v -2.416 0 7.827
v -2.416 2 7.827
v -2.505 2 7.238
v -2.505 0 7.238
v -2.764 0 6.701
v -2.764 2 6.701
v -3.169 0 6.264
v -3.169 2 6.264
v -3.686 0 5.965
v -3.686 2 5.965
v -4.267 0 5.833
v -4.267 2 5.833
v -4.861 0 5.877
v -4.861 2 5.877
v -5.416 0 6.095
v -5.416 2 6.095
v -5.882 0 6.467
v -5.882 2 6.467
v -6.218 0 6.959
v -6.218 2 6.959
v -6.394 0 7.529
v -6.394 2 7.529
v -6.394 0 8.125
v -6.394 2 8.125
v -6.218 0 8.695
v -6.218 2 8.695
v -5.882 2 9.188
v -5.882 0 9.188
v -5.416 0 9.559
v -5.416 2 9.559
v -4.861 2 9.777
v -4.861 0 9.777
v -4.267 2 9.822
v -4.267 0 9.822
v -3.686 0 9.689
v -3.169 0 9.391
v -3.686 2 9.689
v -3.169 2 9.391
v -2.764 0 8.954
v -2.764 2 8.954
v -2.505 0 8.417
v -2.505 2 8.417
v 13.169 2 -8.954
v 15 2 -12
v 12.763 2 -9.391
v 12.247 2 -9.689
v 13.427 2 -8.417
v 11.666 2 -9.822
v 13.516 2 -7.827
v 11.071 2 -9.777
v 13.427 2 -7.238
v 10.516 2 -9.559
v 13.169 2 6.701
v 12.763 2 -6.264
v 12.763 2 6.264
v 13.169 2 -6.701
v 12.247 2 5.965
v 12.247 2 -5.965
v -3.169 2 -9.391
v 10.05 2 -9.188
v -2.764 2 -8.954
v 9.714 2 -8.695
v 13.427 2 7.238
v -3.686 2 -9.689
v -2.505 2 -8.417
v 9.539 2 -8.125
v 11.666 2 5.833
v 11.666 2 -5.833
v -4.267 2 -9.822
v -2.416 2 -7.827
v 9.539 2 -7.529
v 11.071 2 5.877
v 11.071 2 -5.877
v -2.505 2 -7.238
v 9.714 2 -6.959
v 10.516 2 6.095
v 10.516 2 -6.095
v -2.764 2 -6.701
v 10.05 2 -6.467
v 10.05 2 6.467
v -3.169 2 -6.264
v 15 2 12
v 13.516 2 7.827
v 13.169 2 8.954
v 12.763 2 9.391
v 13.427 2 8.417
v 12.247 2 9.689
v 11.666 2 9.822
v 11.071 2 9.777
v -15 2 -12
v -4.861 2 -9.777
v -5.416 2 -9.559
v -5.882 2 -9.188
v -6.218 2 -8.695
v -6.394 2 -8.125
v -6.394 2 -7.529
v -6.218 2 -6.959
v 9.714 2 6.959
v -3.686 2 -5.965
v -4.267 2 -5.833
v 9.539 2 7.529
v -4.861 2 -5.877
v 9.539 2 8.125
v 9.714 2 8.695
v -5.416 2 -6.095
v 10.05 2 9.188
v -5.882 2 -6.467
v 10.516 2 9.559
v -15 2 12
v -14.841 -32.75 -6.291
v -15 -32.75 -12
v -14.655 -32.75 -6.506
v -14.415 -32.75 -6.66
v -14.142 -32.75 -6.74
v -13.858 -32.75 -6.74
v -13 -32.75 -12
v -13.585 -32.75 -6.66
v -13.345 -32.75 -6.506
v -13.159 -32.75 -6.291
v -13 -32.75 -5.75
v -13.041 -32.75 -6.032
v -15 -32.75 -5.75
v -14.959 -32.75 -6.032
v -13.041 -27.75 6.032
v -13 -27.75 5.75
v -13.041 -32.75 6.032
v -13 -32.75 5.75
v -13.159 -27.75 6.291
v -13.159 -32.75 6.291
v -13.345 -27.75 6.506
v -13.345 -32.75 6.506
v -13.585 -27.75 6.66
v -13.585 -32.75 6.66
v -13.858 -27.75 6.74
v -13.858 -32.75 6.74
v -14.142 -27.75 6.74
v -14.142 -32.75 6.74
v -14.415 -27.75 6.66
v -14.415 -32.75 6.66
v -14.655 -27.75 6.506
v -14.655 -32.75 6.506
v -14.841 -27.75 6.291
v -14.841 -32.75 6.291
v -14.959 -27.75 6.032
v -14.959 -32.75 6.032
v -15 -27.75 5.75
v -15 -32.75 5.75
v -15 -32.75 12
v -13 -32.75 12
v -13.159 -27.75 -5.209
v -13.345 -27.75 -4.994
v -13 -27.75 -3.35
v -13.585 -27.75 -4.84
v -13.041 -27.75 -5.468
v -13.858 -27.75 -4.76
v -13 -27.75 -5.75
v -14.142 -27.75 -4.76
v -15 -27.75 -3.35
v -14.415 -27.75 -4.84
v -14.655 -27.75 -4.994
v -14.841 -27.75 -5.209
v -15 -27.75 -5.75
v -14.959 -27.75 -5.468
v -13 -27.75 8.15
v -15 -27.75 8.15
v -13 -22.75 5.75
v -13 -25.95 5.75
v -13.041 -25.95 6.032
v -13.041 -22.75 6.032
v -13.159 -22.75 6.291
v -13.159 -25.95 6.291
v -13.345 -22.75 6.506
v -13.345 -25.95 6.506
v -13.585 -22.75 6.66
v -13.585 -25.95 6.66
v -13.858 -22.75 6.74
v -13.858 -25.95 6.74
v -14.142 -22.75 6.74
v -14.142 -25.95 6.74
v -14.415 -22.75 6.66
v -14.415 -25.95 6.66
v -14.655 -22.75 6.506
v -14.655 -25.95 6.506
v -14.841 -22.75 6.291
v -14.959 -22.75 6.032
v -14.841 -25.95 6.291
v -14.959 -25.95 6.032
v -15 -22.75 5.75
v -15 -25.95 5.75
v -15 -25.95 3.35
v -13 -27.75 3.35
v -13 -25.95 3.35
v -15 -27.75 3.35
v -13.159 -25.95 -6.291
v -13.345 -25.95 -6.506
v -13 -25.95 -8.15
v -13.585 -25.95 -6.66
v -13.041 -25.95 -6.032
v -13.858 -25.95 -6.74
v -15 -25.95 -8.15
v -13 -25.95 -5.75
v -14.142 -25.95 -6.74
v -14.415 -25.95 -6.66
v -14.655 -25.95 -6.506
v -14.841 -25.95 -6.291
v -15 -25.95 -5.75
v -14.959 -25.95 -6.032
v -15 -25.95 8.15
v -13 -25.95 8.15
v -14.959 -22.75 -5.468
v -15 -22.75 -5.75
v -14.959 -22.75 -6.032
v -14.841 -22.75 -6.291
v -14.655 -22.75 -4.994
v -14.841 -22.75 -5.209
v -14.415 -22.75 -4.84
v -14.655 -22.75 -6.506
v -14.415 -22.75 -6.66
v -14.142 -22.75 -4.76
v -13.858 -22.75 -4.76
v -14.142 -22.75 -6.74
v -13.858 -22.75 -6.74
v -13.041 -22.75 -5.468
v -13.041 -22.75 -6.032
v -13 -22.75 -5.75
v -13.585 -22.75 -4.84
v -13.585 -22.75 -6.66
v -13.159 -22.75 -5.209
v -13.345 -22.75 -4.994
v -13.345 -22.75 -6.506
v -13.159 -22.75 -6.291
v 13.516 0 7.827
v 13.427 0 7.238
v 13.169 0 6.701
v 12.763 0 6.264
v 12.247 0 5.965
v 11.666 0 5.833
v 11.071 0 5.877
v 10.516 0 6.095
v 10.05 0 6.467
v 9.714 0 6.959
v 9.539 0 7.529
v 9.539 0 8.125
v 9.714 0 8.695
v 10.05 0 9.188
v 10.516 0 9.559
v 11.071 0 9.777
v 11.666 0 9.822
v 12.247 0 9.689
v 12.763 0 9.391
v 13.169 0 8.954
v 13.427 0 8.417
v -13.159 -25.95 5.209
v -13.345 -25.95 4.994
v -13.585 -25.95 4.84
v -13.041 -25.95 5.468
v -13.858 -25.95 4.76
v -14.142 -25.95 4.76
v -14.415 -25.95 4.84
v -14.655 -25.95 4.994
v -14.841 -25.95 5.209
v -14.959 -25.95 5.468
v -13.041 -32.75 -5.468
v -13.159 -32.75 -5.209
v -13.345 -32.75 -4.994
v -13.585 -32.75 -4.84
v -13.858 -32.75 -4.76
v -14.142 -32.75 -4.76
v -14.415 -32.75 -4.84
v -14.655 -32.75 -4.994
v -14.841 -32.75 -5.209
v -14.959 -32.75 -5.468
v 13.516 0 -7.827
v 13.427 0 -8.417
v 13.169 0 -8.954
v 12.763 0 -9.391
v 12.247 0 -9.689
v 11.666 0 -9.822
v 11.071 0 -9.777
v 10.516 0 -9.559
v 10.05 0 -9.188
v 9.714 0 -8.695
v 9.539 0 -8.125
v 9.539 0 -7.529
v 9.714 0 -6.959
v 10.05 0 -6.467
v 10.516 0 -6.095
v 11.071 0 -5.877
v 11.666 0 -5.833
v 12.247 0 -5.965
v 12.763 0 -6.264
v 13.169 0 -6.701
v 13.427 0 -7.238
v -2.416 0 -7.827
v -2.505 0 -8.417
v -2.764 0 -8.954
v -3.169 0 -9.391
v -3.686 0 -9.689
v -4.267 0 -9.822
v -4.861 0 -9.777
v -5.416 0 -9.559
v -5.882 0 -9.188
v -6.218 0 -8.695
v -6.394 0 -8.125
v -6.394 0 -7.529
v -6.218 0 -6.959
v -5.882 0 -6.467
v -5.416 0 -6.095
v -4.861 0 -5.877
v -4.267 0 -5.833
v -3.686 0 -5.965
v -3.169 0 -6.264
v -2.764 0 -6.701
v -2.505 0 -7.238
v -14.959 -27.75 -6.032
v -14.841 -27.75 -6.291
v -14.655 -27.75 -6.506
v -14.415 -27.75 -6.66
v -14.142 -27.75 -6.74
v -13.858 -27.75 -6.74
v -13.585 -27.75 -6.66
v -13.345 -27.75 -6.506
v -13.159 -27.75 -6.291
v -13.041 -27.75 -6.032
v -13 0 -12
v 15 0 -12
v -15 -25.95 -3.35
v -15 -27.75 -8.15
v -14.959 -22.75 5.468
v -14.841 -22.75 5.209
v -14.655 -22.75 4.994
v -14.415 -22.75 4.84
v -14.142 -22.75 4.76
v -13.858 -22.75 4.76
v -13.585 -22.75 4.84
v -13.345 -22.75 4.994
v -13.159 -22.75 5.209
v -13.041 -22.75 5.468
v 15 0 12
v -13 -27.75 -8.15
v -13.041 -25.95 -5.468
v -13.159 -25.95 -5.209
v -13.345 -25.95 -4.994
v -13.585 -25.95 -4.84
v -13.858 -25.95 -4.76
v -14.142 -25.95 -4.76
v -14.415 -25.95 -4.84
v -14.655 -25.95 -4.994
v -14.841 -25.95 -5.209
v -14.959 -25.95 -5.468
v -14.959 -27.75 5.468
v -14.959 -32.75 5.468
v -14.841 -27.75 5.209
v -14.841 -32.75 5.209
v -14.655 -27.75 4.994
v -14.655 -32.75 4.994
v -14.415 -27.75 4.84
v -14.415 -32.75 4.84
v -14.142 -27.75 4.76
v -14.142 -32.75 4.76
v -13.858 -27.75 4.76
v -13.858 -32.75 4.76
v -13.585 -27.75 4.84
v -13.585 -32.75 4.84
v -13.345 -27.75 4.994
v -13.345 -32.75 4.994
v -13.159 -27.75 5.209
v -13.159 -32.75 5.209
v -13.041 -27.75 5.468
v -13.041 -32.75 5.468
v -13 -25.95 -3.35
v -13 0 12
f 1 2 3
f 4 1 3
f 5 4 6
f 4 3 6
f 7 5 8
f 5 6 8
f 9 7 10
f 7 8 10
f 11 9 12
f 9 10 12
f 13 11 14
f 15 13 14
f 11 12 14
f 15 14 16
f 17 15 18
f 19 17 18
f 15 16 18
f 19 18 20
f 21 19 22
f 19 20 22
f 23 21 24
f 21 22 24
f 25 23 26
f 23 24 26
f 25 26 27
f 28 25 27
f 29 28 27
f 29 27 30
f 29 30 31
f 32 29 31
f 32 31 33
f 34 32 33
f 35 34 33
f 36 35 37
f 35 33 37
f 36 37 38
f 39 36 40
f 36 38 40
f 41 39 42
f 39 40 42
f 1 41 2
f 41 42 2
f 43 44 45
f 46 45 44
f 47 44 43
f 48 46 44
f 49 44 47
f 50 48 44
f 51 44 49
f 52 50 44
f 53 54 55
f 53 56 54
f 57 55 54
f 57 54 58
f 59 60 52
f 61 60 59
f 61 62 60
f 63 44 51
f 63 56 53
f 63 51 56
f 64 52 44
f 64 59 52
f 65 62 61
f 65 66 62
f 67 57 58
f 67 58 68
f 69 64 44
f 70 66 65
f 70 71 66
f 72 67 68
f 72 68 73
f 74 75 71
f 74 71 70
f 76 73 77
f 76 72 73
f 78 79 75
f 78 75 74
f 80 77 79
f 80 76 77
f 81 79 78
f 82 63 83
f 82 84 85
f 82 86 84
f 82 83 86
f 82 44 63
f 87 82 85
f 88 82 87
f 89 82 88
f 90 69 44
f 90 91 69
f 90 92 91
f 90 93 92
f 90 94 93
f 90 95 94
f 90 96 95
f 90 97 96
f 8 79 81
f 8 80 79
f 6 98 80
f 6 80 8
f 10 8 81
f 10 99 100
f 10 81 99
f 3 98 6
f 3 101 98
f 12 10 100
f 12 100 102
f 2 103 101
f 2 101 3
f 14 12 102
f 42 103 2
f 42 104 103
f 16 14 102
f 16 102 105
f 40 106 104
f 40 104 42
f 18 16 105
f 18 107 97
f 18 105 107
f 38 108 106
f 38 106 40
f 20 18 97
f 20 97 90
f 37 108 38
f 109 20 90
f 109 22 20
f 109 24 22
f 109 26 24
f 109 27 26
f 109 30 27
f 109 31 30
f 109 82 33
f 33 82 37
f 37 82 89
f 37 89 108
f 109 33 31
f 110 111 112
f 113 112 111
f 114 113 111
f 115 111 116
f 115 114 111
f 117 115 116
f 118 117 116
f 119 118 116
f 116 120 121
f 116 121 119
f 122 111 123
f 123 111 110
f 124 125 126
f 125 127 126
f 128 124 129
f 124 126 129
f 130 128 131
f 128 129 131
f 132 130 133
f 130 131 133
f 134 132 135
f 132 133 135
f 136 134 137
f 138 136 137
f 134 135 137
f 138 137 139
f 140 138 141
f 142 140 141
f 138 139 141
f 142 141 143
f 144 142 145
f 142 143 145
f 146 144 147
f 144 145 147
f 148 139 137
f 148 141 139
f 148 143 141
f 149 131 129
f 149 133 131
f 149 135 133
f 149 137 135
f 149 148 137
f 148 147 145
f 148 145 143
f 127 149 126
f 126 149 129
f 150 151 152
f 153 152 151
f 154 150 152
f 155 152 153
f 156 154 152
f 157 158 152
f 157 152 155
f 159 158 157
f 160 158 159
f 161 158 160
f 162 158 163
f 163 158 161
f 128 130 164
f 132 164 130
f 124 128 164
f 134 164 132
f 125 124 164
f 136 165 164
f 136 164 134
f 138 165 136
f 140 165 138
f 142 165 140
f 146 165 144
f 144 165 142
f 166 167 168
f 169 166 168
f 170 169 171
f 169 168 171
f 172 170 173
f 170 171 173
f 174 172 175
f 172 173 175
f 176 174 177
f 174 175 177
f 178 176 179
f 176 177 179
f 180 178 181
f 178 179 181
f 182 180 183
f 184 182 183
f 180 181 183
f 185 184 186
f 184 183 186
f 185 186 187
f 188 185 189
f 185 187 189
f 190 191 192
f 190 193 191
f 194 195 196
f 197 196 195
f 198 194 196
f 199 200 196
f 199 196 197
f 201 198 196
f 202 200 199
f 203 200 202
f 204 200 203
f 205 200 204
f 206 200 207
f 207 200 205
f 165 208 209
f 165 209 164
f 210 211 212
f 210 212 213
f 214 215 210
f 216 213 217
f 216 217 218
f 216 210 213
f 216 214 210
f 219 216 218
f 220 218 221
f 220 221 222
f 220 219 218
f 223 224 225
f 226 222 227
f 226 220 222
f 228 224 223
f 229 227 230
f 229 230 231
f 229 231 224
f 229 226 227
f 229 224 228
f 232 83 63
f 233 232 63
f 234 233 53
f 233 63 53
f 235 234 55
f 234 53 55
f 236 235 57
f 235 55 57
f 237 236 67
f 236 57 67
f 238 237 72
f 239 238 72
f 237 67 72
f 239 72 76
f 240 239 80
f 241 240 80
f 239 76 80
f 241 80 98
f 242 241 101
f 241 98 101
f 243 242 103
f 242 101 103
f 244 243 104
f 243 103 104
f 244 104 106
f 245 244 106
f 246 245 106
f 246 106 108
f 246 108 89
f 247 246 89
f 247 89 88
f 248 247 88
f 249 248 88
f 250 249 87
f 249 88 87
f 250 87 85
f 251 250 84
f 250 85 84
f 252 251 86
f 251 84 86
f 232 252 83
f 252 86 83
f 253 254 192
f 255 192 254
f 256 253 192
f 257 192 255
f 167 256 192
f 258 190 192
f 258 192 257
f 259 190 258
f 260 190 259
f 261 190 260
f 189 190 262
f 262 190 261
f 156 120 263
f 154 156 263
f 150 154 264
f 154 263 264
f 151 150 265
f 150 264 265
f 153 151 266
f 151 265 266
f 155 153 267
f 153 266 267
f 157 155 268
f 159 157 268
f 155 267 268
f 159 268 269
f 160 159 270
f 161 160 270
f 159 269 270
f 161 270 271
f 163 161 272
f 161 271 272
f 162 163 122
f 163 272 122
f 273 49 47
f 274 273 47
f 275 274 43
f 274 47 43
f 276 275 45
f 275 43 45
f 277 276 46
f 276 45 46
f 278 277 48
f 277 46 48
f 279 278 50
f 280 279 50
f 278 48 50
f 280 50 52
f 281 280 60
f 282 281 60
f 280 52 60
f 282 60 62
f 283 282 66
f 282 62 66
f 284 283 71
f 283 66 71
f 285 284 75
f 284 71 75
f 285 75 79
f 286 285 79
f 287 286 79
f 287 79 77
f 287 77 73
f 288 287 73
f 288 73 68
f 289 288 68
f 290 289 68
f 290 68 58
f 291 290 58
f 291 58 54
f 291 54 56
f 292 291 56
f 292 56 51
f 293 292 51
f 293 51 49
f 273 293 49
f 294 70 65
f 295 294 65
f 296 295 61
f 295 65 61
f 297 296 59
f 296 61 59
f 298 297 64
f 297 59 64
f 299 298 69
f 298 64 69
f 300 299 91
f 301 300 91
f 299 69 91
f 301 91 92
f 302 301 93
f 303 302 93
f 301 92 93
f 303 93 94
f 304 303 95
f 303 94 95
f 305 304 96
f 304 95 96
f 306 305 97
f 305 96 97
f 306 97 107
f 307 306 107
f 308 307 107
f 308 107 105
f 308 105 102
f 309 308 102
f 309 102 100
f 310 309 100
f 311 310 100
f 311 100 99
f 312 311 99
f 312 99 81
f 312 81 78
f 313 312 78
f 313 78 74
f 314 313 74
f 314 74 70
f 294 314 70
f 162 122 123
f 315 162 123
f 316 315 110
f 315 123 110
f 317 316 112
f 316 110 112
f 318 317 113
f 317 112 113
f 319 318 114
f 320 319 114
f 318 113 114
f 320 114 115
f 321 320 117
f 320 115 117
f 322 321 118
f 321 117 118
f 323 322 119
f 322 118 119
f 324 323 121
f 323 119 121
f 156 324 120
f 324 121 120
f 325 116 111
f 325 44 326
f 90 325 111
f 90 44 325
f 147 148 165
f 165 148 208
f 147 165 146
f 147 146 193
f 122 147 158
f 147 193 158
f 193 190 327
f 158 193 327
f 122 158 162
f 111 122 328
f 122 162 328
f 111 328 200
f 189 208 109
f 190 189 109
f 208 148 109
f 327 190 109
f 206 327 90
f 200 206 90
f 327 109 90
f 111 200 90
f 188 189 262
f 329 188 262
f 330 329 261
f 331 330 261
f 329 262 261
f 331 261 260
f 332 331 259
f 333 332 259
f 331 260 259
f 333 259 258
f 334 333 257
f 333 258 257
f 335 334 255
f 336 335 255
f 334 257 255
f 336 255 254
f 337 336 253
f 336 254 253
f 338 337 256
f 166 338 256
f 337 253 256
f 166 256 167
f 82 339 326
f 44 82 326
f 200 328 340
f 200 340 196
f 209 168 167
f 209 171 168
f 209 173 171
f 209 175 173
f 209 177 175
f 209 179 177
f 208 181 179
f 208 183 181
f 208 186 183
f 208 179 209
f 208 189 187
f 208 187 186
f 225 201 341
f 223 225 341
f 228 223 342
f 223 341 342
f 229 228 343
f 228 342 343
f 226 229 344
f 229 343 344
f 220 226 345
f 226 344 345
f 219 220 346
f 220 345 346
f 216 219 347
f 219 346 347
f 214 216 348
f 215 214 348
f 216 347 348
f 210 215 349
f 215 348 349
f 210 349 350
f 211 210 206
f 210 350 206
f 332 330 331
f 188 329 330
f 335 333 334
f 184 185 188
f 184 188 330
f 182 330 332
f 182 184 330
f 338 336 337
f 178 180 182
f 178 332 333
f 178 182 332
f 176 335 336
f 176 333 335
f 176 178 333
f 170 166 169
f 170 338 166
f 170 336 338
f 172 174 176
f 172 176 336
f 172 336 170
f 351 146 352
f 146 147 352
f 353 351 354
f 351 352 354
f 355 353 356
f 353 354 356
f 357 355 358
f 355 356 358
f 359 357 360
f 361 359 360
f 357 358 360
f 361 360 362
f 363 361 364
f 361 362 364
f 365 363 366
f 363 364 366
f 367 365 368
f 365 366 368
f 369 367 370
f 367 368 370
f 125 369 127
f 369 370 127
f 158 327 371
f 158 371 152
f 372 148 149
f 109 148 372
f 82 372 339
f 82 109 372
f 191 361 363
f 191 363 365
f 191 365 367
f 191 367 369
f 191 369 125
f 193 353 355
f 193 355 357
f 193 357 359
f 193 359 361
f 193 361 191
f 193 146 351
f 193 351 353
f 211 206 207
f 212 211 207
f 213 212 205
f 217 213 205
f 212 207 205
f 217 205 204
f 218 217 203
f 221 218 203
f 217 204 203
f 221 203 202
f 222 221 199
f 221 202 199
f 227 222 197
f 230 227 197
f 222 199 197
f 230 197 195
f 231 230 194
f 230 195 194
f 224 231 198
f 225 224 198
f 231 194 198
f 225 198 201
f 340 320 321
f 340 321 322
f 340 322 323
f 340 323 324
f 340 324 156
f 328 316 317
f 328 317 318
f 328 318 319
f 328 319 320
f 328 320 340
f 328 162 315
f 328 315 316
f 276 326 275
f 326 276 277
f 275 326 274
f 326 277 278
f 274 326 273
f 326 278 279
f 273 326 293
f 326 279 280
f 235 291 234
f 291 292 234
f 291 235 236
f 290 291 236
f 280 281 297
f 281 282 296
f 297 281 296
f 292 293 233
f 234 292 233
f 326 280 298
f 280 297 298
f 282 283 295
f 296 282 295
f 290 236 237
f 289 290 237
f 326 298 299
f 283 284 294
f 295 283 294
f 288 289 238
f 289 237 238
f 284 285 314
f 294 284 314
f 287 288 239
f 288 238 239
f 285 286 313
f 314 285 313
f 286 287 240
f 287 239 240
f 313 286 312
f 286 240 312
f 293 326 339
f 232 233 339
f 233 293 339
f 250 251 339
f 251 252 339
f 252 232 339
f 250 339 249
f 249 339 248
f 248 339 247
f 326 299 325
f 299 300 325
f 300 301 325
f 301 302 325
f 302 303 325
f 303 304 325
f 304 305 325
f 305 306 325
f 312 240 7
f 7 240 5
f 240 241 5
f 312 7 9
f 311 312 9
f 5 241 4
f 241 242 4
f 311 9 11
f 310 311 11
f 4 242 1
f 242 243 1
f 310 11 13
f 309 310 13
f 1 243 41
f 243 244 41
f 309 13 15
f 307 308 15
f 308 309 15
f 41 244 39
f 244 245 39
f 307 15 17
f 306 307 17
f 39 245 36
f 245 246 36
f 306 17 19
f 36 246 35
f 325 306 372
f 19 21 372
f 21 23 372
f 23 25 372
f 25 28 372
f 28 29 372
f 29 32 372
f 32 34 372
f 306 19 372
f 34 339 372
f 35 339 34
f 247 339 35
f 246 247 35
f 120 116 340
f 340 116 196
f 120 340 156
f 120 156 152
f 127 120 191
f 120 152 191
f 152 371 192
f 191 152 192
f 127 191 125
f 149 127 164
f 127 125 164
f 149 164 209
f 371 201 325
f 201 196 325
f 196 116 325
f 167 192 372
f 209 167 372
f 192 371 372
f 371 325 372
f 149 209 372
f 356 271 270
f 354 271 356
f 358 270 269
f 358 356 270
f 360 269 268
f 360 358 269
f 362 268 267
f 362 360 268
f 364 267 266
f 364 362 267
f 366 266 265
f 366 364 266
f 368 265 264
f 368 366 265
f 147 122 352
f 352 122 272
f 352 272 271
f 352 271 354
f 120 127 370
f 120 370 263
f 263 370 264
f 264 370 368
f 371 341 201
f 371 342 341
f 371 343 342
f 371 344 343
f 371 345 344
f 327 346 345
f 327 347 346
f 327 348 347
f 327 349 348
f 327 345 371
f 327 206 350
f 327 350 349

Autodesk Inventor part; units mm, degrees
ref_plane "YZ Plane" through (0, 0, 0) normal (1, 0, 0) x (0, 1, 0)
ref_plane "XZ Plane" through (0, 0, 0) normal (0, 1, 0) x (-1, 0, 0)
sketch "Эскиз1" plane through (0, 0, 0) normal (0, 1, 0) x (-1, 0, 0)
  line L0 (-15, -12) -> (15, -12)
  line L1 (15, -12) -> (15, 12)
  line L2 (15, 12) -> (-15, 12)
  line L3 (-15, 12) -> (-15, -12)
  line L4 (-15, -12) -> (15, 12) construction
  line L5 (15, -12) -> (-15, 12) construction
  point P0 (0, 0)
  dimension "d0" = 24
  dimension "d1" = 30
extrude "Выдавливание1" add sketch "Эскиз1" along normal blind 2
sketch "Эскиз2" plane through (0, 2, 0) normal (0, 1, 0) x (1, 0, 0)
  circle A0 centre (11.5163, 7.8272) radius 2 projected
  circle A1 centre (11.5163, -7.8272) radius 2 projected
  circle A2 centre (-4.4163, -7.8272) radius 2 projected
  circle A3 centre (-4.4163, 7.8272) radius 2 projected
  point P0 (0, 0)
extrude "Выдавливание2" cut sketch "Эскиз2" against normal blind 2
sketch "Эскиз3" plane through (0, 0, 0) normal (0, -1, 0) x (1, 0, 0)
  line L0 (15, -12) -> (-15, -12) projected
  line L1 (-15, 12) -> (15, 12) projected
  line L2 (-15, -12) -> (-13, -12)
  line L3 (-13, -12) -> (-13, 12)
  line L4 (-13, 12) -> (-15, 12)
  line L5 (-15, 12) -> (-15, -12)
  point P0 (0, 0)
  dimension "d6" = 2
ref_plane "РабПлоскость1" through (-96.45, -32.75, -191.5) normal (0, 1, 0) x (0, 0, 1)
extrude "Выдавливание3" add sketch "Эскиз3" along normal up to surface (32.75 mm away)
sketch "Эскиз4" plane through (-15, 2, -12) normal (-1, 0, 0) x (0, 0, 1)
  line L0 (15.35, -27.95) -> (20.15, -27.95)
  line L1 (20.15, -27.95) -> (20.15, -29.75)
  line L2 (20.15, -29.75) -> (15.35, -29.75)
  line L3 (15.35, -29.75) -> (15.35, -27.95)
  line L4 (15.35, -27.95) -> (20.15, -29.75) construction
  line L5 (20.15, -27.95) -> (15.35, -29.75) construction
  line L6 (3.85, -27.95) -> (8.65, -27.95)
  line L7 (8.65, -27.95) -> (8.65, -29.75)
  line L8 (3.85, -29.75) -> (3.85, -27.95)
  line L9 (3.85, -27.95) -> (8.65, -29.75) construction
  line L10 (8.65, -27.95) -> (3.85, -29.75) construction
  line L11 (8.65, -29.75) -> (3.85, -29.75)
  line L12 (24, -2) -> (24, -34.75) projected
  line L13 (24, -34.75) -> (-0.0211, -34.75)
  line L14 (0, 0) -> (0, -34.75) projected
  line L15 (24, -34.75) -> (24, 0) projected
  line L16 (0, 0) -> (24, 0) projected
  line L17 (0, 0) -> (0, -34.75) projected
  line L18 (24, -34.75) -> (0, -34.75) projected
  point P0 (12, -2)
  point P1 (17.75, -28.85)
  point P2 (6.25, -28.85)
  dimension "d9" = 4.8
  dimension "d10" = 1.8
  dimension "d13" = 4.8
  dimension "d14" = 1.8
  dimension "d15" = 5
  dimension "d16" = 5
  dimension "d17" = 3.85
  dimension "d18" = 3.85
extrude "Выдавливание5" cut sketch "Эскиз4" against normal blind 10 contours L0 L1 L2 L3 | L6 L7 L11 L8
sketch "Эскиз5" plane through (-15, -32.75, -12) normal (0, -1, 0) x (1, 0, 0)
  circle A0 centre (1, 6.25) radius 1 projected
  circle A1 centre (1, 17.75) radius 1 projected
  point P0 (15, 12)
extrude "Выдавливание7" cut sketch "Эскиз5" against normal blind 10
properties part number "крепление энкодера"
